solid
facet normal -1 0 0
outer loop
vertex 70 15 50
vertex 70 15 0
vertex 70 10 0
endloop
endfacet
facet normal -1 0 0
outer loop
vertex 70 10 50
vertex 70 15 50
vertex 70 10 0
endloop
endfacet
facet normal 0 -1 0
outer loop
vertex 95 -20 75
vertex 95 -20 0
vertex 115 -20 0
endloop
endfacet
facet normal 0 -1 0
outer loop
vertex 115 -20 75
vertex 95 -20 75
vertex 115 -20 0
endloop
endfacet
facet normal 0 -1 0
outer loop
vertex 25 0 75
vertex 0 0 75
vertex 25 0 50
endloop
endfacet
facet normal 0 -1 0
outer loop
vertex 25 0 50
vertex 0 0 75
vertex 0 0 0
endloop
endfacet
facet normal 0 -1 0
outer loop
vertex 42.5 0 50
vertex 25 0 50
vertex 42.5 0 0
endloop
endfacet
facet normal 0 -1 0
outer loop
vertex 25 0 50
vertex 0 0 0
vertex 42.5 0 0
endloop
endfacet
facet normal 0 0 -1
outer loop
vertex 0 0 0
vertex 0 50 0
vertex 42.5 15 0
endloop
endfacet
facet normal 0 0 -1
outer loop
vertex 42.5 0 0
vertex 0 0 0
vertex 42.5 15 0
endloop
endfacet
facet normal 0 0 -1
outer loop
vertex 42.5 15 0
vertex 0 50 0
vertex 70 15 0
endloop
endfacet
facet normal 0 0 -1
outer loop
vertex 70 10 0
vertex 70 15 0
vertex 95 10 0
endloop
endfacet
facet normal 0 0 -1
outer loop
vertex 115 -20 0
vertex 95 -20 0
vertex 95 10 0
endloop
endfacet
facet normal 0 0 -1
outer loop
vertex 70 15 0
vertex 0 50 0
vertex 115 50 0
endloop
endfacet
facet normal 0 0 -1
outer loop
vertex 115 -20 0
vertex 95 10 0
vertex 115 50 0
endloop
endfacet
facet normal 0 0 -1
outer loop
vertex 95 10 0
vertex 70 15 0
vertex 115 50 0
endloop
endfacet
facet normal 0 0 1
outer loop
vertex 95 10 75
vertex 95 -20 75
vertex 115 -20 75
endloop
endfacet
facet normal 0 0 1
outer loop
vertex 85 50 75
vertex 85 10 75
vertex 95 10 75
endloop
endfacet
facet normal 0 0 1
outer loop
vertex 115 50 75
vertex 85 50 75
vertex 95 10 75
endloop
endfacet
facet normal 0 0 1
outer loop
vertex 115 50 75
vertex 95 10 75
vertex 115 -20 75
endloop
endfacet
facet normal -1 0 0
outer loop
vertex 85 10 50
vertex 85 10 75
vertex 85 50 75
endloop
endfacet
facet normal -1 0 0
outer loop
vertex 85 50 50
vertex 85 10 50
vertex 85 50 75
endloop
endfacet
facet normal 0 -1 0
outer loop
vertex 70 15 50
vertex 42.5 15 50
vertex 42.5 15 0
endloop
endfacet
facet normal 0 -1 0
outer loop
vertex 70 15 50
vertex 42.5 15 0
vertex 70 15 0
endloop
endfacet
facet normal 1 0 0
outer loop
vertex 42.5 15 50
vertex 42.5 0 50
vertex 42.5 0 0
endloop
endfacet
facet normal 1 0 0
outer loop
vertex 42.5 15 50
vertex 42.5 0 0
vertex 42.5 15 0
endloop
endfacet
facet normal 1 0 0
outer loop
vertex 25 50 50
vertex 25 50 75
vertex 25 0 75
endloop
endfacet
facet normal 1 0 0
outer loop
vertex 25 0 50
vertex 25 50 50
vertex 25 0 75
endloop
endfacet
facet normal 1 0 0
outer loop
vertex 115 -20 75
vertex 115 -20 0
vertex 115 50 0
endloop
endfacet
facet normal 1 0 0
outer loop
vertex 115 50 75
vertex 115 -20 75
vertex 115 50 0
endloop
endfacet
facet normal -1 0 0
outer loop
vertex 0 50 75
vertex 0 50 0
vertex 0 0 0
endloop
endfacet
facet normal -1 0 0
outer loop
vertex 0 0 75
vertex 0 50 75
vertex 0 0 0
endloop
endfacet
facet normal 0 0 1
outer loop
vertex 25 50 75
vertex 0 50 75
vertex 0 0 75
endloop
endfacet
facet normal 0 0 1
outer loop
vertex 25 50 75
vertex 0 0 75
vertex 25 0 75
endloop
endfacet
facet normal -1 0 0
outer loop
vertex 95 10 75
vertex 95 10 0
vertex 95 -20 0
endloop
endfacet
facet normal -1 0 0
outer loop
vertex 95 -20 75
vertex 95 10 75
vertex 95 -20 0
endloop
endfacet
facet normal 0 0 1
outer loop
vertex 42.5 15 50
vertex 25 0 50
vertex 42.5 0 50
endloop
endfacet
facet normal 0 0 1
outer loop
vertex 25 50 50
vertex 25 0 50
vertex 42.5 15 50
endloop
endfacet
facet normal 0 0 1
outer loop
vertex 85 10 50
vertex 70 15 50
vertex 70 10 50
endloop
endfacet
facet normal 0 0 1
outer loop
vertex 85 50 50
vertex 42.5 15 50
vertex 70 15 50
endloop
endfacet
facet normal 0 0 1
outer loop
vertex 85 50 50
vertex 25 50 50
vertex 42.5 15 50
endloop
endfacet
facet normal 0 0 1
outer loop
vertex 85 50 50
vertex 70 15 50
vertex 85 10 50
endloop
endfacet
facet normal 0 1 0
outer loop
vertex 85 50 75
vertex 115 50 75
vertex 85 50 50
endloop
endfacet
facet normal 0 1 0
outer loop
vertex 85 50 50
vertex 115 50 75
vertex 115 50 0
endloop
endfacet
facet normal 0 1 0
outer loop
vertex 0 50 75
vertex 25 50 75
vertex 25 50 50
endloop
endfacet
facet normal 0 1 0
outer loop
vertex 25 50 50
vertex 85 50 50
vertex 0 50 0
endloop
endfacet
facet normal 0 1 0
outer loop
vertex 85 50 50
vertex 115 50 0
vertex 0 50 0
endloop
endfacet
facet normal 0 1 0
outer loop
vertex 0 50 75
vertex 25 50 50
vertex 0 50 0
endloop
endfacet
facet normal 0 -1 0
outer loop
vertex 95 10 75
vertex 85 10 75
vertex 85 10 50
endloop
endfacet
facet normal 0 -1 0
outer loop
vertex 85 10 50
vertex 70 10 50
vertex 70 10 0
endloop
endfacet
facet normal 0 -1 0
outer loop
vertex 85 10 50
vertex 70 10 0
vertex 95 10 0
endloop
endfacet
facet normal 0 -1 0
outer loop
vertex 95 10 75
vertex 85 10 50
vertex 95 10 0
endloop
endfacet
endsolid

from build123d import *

# Parameters (mm, degrees)
F1_DEPTH = 75
F3_DEPTH = 25


with BuildPart() as f1:
    # F0 (on Top) → F1 (new body)
    with BuildSketch(Plane.XY):
        Polygon((0, 50), (0, 0), (42.5, 0), (42.5, 15), (70, 15), (70, 10), (95, 10), (95, -20), (115, -20), (115, 50), align=None)
    extrude(amount=F1_DEPTH)

    # F2 (on face) → F3 (cut)
    with BuildSketch(Plane.XY.offset(75)):
        Polygon((85, 50), (25, 50), (25, 0), (42.5, 0), (42.5, 15), (70, 15), (70, 10), (85, 10), align=None)
    extrude(amount=-F3_DEPTH, mode=Mode.SUBTRACT)


solid = f1.part
